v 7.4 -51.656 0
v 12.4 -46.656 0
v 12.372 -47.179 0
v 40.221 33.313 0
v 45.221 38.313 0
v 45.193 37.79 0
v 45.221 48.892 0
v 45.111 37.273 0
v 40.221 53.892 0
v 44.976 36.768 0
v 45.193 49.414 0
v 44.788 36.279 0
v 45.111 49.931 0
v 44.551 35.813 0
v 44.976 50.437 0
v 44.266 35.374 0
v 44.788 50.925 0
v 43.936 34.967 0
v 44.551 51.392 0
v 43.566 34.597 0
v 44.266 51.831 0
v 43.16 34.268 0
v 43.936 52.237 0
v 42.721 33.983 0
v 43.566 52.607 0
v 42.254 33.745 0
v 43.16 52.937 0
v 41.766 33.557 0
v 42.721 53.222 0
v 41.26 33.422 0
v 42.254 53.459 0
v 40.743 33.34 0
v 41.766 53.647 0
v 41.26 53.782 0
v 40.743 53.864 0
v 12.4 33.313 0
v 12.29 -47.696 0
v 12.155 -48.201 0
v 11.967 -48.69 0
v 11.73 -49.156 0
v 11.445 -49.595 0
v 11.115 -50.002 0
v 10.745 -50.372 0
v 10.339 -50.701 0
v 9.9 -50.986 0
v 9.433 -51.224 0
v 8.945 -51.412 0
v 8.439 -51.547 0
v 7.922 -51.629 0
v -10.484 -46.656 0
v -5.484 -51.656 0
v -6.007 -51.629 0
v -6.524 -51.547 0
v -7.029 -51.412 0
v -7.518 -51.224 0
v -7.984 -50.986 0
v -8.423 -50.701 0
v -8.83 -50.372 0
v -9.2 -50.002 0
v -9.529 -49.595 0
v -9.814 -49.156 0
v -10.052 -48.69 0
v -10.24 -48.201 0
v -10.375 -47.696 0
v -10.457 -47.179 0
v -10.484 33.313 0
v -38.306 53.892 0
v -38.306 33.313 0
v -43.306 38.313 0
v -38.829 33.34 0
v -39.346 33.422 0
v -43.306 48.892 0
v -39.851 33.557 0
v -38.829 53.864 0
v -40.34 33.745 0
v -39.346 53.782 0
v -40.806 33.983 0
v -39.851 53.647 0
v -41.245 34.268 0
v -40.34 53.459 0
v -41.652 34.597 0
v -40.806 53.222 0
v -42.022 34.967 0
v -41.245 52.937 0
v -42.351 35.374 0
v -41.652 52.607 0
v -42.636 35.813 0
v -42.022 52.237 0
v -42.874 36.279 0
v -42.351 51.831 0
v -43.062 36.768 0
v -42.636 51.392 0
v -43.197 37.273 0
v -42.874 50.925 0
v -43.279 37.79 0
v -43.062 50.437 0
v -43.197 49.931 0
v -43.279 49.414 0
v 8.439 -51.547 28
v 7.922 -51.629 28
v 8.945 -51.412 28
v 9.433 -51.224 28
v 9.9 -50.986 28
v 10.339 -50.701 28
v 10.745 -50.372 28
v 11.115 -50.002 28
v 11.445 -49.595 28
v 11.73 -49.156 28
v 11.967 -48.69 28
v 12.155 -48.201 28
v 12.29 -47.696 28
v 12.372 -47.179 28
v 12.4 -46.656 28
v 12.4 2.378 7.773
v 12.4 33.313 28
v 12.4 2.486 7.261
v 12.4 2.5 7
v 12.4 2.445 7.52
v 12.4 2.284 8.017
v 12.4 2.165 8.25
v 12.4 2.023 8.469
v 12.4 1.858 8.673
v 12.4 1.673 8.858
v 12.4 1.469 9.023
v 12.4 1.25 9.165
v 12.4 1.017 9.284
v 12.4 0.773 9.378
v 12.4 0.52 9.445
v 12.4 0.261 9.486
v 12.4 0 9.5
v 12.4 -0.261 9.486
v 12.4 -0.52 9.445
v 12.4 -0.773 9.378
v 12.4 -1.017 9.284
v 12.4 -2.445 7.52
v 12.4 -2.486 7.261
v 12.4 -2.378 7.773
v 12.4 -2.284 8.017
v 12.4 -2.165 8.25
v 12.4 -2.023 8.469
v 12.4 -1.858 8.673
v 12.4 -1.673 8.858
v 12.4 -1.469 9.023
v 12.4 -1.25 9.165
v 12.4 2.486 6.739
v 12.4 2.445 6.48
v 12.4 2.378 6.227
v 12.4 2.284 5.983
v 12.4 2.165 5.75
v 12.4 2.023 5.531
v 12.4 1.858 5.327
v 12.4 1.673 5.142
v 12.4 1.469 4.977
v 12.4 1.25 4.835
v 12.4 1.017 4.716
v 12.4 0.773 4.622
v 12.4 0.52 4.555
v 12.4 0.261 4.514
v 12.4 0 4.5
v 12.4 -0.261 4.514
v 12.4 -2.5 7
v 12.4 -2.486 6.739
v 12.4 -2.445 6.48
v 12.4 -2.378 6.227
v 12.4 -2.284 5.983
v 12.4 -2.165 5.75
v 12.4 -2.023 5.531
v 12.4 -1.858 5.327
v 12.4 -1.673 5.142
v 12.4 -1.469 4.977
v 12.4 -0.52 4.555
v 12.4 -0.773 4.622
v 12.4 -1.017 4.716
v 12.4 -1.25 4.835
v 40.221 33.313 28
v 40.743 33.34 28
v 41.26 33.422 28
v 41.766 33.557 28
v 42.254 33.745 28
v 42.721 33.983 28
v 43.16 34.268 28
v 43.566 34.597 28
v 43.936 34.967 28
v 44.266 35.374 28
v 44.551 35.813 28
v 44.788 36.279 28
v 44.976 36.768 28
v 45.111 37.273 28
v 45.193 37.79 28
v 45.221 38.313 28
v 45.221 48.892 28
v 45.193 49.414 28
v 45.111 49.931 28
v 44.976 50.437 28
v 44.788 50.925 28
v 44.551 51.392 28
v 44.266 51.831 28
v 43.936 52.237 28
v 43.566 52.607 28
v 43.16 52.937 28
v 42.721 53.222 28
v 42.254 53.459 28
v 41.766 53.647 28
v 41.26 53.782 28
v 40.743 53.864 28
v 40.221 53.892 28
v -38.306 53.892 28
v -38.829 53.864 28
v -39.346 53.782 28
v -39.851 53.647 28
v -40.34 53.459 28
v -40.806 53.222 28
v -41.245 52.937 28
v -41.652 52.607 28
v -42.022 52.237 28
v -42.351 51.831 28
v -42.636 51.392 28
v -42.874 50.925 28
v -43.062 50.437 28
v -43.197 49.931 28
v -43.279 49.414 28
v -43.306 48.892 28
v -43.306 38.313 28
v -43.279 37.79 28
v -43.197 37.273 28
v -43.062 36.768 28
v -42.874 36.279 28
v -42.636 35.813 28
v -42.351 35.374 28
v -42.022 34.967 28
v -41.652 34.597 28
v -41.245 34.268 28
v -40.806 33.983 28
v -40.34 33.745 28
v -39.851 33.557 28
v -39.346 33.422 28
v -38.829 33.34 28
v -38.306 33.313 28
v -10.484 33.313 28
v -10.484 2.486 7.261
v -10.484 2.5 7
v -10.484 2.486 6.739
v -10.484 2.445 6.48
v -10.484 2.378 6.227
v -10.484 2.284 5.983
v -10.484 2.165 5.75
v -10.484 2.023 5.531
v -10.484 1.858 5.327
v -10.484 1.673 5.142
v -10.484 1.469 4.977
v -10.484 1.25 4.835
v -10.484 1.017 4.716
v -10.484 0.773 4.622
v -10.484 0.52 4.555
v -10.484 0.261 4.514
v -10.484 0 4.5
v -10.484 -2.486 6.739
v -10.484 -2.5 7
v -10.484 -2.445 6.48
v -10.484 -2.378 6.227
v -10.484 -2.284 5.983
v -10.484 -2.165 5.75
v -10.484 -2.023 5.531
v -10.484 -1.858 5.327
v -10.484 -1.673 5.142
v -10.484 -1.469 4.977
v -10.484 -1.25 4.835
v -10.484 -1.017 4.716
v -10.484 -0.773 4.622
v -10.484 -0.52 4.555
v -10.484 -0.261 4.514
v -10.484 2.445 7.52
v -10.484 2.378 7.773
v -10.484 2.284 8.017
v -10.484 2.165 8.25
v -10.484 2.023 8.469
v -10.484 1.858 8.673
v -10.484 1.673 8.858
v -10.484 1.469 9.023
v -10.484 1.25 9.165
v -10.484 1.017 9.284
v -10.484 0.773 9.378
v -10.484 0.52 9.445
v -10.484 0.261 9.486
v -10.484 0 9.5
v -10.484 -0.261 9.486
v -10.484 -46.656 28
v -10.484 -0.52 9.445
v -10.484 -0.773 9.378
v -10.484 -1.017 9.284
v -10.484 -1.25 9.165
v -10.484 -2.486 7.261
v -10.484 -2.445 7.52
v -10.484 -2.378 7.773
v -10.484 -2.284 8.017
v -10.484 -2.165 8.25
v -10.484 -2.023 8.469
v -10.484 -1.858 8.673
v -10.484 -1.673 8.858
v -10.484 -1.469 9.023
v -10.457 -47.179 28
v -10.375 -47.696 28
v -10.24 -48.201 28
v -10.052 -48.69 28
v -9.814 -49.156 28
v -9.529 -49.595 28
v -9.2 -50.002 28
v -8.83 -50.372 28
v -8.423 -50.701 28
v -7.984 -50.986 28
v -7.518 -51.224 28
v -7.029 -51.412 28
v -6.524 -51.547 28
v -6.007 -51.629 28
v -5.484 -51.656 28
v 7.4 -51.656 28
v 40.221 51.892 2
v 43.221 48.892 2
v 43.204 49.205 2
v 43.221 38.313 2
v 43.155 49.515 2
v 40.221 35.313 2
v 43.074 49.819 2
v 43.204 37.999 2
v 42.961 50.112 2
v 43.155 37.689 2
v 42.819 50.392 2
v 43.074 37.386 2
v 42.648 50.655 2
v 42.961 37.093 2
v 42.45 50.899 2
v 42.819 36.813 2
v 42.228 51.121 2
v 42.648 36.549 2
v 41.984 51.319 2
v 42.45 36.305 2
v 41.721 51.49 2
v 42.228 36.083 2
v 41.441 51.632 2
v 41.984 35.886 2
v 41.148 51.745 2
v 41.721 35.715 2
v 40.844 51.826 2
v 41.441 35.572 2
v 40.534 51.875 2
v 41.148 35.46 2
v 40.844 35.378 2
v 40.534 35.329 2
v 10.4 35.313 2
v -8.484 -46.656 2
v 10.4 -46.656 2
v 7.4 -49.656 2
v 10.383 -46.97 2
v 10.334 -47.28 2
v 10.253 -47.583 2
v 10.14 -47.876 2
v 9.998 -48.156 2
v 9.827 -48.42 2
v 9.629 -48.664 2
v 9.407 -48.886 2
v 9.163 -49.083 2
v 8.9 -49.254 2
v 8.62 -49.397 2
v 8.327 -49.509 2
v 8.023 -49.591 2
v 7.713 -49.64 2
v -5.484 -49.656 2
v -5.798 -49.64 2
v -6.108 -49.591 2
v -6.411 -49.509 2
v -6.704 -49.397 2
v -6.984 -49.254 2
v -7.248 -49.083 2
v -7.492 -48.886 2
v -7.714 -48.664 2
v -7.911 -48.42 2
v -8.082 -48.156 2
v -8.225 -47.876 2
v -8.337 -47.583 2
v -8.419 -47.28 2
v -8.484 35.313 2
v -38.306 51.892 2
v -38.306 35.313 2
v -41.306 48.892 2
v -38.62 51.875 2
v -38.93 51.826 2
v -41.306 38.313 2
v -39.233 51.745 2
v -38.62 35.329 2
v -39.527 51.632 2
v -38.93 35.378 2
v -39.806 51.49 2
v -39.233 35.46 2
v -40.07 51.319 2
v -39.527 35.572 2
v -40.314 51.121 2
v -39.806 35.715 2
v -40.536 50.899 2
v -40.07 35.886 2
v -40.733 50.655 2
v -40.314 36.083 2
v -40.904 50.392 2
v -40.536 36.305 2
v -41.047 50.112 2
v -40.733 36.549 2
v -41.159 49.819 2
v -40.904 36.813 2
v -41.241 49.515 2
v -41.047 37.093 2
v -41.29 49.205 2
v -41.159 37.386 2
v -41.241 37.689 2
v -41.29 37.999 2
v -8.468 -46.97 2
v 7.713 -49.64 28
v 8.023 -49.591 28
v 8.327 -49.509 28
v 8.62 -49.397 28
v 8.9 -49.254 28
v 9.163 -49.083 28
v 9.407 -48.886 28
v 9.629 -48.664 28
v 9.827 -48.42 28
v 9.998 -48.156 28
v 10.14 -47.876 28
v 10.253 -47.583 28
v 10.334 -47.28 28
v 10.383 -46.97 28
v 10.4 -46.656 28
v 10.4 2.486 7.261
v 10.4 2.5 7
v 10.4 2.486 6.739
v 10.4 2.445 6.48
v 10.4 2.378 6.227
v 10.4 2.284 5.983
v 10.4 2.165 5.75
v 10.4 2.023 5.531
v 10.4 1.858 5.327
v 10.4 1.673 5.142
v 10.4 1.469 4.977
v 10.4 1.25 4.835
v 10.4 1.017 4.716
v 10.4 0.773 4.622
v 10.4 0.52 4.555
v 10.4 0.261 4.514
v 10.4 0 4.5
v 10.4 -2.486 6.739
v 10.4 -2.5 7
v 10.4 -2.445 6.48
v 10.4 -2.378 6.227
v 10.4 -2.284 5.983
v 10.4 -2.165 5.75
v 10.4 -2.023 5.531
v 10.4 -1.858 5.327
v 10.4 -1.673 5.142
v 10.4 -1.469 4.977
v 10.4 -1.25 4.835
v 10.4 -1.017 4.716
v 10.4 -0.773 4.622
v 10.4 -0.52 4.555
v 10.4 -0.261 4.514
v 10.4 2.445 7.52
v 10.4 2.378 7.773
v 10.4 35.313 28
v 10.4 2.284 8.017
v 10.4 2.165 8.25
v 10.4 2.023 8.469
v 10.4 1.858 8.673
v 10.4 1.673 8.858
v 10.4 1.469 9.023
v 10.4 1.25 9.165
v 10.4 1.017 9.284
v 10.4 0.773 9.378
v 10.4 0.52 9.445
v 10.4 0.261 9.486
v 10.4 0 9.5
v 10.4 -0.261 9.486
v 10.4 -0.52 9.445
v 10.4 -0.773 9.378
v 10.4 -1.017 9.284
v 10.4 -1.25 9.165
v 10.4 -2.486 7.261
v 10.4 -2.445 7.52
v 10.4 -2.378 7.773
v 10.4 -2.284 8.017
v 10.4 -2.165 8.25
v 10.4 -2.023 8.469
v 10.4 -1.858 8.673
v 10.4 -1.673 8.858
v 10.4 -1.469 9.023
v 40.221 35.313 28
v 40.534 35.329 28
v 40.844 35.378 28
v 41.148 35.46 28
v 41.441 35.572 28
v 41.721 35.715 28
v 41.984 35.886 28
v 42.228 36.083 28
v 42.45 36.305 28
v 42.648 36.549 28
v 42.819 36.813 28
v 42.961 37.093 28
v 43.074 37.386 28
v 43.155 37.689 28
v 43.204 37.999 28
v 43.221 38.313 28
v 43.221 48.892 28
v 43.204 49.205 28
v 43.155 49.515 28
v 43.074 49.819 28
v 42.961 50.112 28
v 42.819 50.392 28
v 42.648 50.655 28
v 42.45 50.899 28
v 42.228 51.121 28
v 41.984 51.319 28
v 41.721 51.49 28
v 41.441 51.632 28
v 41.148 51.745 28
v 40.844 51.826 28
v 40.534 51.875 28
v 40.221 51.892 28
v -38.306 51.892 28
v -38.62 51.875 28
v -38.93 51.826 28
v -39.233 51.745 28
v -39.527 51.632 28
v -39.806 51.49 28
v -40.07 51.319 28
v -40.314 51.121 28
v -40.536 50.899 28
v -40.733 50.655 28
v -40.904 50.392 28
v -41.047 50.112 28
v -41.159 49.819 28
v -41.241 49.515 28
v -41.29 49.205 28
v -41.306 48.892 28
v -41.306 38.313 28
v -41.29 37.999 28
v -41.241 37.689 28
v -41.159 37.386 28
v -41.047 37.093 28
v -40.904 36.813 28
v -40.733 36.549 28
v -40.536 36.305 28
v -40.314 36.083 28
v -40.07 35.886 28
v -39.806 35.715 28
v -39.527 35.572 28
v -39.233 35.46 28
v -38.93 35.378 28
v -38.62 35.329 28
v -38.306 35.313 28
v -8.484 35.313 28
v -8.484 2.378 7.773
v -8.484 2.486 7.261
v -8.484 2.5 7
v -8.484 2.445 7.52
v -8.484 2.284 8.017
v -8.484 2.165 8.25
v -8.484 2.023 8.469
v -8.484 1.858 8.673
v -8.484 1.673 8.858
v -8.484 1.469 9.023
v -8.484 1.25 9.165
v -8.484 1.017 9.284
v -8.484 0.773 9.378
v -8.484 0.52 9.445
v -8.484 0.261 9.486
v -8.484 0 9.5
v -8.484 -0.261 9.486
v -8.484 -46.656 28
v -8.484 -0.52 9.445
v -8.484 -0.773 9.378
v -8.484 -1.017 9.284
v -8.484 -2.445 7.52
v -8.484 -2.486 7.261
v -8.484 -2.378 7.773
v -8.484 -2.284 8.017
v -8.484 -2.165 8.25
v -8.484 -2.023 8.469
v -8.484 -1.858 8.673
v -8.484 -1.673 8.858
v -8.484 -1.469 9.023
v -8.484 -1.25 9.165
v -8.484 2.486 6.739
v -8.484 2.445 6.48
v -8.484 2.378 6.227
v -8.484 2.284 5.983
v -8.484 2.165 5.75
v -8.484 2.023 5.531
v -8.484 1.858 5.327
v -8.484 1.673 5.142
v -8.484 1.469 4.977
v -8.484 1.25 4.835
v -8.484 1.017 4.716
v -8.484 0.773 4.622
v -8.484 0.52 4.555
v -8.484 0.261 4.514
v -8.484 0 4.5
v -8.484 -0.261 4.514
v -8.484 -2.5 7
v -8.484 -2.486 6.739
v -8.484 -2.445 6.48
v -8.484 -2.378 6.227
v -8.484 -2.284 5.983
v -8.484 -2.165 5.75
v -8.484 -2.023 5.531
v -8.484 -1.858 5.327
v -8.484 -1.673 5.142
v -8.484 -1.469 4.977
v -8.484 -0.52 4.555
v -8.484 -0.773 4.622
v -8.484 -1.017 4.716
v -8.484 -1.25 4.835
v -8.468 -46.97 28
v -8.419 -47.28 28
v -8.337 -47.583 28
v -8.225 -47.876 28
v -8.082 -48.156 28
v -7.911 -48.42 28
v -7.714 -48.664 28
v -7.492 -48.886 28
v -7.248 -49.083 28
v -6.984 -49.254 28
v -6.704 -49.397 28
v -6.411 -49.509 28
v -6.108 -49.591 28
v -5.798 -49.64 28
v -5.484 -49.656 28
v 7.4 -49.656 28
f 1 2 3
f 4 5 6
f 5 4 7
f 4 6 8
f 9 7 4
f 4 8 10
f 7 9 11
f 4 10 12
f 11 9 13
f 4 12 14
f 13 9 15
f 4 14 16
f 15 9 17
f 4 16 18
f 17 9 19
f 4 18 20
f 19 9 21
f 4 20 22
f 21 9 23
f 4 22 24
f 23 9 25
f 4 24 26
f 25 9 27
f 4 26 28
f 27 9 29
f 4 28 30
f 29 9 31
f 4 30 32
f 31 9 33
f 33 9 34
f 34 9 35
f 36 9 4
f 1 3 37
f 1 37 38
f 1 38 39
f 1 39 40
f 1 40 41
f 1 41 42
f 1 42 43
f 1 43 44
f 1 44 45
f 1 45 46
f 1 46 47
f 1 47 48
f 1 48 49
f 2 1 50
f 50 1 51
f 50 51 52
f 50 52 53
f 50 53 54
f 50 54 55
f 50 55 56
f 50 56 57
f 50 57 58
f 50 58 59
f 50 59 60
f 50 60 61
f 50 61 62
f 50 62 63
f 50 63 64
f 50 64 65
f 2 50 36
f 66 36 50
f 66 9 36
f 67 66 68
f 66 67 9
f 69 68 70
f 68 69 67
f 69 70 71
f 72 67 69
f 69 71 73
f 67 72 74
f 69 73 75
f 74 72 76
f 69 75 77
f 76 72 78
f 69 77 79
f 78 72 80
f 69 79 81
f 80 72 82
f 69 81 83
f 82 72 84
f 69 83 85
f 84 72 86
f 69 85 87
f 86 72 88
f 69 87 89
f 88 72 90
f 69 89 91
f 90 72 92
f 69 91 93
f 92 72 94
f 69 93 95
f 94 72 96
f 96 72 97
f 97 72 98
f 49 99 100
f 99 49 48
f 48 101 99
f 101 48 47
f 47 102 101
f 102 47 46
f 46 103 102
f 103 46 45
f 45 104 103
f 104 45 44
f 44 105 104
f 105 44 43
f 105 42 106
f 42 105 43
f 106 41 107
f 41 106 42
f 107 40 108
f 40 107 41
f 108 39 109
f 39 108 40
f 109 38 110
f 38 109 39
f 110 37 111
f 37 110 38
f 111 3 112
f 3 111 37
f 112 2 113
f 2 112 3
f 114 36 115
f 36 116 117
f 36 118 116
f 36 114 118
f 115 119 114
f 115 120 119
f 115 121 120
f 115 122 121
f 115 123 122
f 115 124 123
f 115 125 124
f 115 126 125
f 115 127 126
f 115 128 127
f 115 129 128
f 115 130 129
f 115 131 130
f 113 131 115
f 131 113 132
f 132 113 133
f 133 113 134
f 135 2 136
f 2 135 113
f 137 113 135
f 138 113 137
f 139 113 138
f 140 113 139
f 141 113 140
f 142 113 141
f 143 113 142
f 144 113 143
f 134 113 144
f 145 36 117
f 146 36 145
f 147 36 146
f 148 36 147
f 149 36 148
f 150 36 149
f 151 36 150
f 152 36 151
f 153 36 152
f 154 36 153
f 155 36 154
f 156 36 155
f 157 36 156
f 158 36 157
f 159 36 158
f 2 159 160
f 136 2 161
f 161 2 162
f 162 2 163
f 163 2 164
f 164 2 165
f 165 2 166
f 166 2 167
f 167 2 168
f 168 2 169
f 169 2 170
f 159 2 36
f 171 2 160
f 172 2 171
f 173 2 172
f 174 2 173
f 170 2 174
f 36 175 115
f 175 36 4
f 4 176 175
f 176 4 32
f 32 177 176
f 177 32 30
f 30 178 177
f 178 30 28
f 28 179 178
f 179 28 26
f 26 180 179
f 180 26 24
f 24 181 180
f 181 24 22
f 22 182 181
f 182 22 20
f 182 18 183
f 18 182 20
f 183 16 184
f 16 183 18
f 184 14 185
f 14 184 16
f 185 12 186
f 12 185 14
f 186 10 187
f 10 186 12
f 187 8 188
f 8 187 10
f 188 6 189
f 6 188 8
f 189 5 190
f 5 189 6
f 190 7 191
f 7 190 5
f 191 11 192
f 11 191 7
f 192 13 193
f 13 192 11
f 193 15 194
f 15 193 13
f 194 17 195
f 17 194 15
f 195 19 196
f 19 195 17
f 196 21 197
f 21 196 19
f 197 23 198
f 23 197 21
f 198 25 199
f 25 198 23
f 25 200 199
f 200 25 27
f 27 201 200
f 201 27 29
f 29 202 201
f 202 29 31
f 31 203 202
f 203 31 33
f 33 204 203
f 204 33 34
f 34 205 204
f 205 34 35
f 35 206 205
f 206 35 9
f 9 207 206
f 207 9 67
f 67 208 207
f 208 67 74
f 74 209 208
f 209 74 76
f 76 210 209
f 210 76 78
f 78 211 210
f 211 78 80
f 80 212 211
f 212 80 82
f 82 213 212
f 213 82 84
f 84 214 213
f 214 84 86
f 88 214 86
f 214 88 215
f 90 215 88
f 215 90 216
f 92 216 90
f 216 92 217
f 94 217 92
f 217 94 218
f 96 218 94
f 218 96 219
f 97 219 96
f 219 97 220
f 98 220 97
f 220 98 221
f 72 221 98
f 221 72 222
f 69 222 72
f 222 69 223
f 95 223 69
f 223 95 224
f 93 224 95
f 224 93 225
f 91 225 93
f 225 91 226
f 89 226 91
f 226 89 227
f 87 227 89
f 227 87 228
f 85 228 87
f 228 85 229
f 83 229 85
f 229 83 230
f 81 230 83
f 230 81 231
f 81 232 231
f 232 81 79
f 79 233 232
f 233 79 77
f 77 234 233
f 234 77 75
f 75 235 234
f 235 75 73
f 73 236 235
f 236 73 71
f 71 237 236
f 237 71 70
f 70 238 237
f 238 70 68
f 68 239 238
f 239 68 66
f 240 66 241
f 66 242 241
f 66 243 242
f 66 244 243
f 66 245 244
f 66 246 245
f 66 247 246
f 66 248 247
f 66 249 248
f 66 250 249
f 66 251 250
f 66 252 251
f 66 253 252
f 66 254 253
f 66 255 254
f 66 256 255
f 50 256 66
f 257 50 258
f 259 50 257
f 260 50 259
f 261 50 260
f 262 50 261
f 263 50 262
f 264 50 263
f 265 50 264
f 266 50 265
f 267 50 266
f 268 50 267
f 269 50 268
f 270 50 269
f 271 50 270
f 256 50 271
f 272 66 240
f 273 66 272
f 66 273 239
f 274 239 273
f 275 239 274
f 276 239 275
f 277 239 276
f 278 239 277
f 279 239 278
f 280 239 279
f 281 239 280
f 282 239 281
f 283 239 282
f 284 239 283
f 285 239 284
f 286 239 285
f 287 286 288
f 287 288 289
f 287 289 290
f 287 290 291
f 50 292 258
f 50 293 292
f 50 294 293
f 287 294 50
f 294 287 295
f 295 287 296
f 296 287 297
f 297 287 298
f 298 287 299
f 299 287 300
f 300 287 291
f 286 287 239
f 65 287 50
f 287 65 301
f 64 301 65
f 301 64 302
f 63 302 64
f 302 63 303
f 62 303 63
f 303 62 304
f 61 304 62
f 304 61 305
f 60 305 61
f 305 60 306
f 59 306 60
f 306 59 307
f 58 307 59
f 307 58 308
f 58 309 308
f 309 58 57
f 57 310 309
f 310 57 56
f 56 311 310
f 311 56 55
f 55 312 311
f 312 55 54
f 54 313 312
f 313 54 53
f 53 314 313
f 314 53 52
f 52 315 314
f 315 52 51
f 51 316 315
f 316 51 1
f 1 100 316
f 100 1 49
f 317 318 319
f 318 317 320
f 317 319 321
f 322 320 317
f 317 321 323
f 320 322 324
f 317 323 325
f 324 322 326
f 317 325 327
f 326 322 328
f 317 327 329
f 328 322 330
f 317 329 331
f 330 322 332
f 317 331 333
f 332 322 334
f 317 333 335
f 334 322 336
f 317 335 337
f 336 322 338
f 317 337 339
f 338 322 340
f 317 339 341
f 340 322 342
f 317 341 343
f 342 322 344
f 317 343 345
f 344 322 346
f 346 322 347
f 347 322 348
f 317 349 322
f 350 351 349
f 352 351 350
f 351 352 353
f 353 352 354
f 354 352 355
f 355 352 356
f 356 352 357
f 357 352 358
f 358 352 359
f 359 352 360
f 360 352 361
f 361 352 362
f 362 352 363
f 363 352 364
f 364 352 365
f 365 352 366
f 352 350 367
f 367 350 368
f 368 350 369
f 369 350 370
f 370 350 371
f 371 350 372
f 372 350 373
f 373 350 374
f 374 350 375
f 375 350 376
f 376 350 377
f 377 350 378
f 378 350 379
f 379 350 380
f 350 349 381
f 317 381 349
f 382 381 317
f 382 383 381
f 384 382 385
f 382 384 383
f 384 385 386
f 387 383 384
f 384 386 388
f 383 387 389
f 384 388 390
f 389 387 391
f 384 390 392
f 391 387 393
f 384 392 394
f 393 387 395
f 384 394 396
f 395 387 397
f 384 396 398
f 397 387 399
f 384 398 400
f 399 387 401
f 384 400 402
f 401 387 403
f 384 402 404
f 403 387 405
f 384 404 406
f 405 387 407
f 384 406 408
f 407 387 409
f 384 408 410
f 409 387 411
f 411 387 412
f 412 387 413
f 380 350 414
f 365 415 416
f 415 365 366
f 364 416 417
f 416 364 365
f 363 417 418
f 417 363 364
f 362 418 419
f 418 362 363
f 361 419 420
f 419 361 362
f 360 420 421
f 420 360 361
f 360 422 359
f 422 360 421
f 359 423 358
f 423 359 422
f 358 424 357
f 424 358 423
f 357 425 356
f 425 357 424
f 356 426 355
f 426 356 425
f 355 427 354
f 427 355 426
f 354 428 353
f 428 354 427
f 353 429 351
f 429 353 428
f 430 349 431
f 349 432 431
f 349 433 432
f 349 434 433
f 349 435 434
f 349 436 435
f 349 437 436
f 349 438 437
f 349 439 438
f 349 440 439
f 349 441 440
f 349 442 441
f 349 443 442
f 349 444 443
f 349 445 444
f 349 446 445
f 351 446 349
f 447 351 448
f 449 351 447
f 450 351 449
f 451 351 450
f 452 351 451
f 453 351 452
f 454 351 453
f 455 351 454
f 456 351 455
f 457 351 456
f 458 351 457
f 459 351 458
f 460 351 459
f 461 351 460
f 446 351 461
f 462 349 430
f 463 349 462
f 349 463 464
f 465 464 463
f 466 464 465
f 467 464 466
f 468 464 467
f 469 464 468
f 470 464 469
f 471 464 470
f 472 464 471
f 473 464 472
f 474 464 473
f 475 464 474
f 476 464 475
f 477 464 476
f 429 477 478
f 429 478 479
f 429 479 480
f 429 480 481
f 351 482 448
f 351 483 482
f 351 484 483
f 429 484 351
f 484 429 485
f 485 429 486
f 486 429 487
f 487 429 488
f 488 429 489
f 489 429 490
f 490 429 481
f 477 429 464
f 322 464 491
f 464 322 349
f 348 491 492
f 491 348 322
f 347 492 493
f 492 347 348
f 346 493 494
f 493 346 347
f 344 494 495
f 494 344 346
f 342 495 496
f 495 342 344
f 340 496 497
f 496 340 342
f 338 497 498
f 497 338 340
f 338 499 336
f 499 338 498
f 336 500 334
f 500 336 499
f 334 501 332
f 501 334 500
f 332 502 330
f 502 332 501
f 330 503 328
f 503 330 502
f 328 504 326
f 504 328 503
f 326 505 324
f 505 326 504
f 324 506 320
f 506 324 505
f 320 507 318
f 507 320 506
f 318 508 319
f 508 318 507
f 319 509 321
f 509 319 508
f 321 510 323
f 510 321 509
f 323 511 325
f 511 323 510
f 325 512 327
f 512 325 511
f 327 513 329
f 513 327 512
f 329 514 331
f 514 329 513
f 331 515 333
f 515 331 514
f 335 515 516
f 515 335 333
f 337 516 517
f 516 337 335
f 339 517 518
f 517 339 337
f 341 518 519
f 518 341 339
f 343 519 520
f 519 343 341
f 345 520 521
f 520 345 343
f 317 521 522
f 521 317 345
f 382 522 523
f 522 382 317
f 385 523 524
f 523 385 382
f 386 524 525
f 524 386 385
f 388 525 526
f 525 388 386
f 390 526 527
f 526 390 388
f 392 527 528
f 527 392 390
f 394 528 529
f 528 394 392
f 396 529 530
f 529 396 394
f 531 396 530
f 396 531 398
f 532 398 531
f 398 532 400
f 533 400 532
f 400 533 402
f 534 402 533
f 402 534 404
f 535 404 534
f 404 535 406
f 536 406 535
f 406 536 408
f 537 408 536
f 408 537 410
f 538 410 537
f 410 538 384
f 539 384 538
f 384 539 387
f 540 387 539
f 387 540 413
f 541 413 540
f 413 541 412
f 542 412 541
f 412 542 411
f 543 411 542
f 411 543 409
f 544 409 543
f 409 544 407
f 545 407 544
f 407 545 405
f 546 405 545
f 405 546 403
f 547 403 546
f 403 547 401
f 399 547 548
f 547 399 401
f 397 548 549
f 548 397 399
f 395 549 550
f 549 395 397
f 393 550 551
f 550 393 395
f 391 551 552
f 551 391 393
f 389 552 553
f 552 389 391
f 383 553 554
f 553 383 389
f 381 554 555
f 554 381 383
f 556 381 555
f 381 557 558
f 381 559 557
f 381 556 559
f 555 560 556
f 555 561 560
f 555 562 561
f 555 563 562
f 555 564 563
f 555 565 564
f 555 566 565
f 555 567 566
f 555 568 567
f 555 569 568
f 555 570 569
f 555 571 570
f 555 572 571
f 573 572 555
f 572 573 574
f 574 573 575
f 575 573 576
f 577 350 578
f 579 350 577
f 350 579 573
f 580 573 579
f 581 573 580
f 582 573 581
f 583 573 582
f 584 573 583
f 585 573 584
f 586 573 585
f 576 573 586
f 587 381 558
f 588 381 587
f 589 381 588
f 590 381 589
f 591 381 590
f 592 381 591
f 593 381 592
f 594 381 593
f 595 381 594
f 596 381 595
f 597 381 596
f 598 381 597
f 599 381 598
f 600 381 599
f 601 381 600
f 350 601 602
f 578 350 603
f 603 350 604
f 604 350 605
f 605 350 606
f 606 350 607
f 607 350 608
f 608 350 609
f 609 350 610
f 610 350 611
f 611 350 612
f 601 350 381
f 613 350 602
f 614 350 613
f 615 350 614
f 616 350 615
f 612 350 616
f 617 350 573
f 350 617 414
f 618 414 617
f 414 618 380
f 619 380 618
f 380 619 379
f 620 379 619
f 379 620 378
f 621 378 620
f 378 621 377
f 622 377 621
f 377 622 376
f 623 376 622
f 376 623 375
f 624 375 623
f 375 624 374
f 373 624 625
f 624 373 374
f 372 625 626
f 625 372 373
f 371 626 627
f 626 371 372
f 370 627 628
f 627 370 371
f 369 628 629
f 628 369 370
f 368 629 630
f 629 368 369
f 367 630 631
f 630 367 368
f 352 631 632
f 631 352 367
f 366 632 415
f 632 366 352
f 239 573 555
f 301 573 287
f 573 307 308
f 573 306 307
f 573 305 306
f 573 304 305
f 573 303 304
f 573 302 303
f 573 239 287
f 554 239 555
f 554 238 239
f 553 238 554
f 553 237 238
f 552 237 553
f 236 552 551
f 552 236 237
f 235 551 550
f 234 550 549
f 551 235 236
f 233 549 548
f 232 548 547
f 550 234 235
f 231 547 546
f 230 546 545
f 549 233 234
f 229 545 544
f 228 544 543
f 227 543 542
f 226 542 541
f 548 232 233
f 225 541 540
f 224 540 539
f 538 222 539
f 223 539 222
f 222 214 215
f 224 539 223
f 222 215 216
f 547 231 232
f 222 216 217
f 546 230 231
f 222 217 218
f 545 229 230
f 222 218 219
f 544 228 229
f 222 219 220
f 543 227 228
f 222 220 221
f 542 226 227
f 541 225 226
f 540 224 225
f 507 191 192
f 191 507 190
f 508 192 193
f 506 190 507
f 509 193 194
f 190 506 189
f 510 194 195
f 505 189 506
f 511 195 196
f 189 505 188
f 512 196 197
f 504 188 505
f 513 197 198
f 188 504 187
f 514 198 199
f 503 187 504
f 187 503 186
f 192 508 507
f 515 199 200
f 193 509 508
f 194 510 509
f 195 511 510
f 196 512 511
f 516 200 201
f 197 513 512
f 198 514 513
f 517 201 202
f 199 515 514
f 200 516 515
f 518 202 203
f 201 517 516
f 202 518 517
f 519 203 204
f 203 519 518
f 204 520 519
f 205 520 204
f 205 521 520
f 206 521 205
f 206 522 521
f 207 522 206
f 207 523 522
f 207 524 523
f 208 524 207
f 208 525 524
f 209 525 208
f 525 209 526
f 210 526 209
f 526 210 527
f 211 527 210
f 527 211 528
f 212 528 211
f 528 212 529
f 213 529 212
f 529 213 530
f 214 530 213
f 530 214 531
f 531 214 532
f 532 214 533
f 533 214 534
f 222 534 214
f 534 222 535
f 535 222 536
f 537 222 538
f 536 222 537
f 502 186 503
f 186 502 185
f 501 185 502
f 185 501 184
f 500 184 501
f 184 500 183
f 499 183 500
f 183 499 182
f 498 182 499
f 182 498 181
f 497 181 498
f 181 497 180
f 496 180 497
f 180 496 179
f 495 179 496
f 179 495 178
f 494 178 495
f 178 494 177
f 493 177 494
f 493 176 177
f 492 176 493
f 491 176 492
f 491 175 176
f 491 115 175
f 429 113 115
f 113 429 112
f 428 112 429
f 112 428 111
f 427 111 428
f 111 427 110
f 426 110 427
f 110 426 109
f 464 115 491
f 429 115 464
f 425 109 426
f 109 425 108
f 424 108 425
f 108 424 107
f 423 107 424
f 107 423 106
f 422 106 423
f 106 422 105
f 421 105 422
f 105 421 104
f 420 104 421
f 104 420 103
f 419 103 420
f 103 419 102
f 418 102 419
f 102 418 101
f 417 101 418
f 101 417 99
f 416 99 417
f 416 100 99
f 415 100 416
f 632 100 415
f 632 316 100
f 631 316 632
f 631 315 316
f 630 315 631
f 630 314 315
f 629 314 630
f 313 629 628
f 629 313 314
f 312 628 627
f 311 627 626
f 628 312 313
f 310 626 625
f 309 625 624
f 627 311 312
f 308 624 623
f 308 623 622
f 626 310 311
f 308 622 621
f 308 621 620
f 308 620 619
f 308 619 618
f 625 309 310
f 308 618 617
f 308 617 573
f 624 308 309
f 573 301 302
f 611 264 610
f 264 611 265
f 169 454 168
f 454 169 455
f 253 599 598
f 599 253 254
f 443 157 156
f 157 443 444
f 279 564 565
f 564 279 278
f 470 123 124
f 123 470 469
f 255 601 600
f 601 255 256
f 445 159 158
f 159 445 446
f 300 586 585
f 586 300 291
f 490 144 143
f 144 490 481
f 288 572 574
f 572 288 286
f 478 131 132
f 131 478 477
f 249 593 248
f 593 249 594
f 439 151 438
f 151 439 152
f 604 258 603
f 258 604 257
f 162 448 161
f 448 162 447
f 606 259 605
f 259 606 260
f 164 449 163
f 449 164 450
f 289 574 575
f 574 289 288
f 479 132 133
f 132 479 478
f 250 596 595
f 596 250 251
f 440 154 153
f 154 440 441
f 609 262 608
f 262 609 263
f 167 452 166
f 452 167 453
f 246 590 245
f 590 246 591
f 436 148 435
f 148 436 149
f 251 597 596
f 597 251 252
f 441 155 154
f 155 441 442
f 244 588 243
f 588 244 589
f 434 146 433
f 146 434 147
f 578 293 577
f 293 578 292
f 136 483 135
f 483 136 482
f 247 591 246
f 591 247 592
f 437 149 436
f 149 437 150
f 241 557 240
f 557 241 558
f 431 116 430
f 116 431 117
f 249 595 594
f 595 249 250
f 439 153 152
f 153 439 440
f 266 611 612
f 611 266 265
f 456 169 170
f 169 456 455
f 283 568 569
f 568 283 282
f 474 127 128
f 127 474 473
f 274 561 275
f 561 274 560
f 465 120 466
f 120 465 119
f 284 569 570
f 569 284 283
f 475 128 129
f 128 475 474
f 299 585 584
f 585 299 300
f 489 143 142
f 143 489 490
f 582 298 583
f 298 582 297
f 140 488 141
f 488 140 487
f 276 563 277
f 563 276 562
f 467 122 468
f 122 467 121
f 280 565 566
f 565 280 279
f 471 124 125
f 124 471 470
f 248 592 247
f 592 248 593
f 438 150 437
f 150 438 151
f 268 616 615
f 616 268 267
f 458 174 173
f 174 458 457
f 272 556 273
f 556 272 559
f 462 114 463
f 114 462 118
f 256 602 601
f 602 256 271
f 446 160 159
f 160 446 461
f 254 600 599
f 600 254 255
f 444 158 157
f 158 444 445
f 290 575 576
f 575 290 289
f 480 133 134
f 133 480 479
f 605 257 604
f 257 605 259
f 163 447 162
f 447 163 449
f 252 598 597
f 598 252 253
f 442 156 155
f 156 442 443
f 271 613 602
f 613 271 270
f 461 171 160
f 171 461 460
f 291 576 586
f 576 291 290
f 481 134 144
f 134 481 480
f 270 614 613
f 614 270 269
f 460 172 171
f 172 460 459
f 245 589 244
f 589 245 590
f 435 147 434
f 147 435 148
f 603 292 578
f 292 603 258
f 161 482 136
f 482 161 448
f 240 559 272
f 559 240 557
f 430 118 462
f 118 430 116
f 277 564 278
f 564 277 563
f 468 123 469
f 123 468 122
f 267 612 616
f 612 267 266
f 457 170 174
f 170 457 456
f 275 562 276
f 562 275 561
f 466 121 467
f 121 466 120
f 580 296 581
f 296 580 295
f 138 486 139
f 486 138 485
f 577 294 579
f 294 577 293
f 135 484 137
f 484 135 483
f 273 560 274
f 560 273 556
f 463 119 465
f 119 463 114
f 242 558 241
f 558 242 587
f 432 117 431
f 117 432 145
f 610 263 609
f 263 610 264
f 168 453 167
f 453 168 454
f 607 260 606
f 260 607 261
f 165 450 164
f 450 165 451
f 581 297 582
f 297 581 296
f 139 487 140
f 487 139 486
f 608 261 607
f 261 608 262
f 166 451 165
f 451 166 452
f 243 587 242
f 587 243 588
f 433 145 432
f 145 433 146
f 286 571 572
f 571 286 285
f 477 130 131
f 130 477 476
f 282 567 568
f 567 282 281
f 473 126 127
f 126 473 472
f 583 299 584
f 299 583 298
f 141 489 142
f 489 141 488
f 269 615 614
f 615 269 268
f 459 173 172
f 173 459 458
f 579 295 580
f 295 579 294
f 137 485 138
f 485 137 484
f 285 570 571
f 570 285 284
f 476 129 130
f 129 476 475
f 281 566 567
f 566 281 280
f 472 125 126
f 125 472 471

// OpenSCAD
// AUTOMATICALLY GENERATED FILE: Letter_T
// SIGN SCULPTOR ENGINE V2

Render_Mode = "Body"; // Set to "Lid" to export the cover
Letter = "T";
Font_Size = 100;
Font_Name = "Arial:style=Black";
Light_Type = "Silicone_Neon_6mm";

// -- Engineering Constants --
Sign_Height = 30.0;
Wall_Thickness = 2.0;
Base_Thickness = 2.0;
Lid_Tolerance = 0.15;
Hole_Height = 5.0;
Hole_Size = 5.0;

// -- Logic Engine --
CW = (Light_Type == "Silicone_Neon_6mm") ? 6.0 :
     (Light_Type == "Silicone_Neon_8mm") ? 8.0 :
     (Light_Type == "LED_Strip_10mm")    ? 10.5 :
     (Light_Type == "Individual_Pixels")  ? 14.0 : 6.0;

Lip_Overhang = (Light_Type == "Silicone_Neon_6mm" || Light_Type == "Silicone_Neon_8mm") ? 0.4 : 0.0;

$fn = 60;

module letter_shape() {
    text(text=Letter, size=Font_Size, font=Font_Name, halign="center", valign="center");
}

module body_geometry() {
    difference() {
        // 1. Positive Block
        linear_extrude(Sign_Height)
            offset(r = CW/2 + Wall_Thickness)
            letter_shape();

        // 2. Light Channel
        translate([0,0, Base_Thickness])
            linear_extrude(Sign_Height + 1)
            offset(r = CW/2)
            letter_shape();

        // 3. Friction Lip
        if (Lip_Overhang > 0) {
            translate([0,0, Sign_Height - 2.0])
                linear_extrude(3.0)
                difference() {
                    offset(r = CW/2 + 5) letter_shape();
                    offset(r = CW/2 - Lip_Overhang) letter_shape();
                }
        }
        
        // 4. Lid Shelf
        translate([0,0, Sign_Height - 2.0])
            linear_extrude(3.0)
            offset(r = CW/2 + 1.5)
            letter_shape();

        // 5. WIRE CHANNELS (Dynamic Side Holes)
        // Left Hole
        translate([-Font_Size/1.8, 0, Hole_Height + Base_Thickness])
            rotate([0, 90, 0])
            cylinder(h = Font_Size, r = Hole_Size/2);
            
        // Right Hole
        translate([Font_Size/1.8, 0, Hole_Height + Base_Thickness])
            rotate([0, -90, 0])
            cylinder(h = Font_Size, r = Hole_Size/2);
    }
}

module lid_geometry() {
    color("White")
        linear_extrude(2.0)
        offset(r = (CW/2 + 1.5) - Lid_Tolerance)
        letter_shape();
}

// Render Controller
if (Render_Mode == "Body") {
    body_geometry();
} else if (Render_Mode == "Lid") {
    lid_geometry();
}
